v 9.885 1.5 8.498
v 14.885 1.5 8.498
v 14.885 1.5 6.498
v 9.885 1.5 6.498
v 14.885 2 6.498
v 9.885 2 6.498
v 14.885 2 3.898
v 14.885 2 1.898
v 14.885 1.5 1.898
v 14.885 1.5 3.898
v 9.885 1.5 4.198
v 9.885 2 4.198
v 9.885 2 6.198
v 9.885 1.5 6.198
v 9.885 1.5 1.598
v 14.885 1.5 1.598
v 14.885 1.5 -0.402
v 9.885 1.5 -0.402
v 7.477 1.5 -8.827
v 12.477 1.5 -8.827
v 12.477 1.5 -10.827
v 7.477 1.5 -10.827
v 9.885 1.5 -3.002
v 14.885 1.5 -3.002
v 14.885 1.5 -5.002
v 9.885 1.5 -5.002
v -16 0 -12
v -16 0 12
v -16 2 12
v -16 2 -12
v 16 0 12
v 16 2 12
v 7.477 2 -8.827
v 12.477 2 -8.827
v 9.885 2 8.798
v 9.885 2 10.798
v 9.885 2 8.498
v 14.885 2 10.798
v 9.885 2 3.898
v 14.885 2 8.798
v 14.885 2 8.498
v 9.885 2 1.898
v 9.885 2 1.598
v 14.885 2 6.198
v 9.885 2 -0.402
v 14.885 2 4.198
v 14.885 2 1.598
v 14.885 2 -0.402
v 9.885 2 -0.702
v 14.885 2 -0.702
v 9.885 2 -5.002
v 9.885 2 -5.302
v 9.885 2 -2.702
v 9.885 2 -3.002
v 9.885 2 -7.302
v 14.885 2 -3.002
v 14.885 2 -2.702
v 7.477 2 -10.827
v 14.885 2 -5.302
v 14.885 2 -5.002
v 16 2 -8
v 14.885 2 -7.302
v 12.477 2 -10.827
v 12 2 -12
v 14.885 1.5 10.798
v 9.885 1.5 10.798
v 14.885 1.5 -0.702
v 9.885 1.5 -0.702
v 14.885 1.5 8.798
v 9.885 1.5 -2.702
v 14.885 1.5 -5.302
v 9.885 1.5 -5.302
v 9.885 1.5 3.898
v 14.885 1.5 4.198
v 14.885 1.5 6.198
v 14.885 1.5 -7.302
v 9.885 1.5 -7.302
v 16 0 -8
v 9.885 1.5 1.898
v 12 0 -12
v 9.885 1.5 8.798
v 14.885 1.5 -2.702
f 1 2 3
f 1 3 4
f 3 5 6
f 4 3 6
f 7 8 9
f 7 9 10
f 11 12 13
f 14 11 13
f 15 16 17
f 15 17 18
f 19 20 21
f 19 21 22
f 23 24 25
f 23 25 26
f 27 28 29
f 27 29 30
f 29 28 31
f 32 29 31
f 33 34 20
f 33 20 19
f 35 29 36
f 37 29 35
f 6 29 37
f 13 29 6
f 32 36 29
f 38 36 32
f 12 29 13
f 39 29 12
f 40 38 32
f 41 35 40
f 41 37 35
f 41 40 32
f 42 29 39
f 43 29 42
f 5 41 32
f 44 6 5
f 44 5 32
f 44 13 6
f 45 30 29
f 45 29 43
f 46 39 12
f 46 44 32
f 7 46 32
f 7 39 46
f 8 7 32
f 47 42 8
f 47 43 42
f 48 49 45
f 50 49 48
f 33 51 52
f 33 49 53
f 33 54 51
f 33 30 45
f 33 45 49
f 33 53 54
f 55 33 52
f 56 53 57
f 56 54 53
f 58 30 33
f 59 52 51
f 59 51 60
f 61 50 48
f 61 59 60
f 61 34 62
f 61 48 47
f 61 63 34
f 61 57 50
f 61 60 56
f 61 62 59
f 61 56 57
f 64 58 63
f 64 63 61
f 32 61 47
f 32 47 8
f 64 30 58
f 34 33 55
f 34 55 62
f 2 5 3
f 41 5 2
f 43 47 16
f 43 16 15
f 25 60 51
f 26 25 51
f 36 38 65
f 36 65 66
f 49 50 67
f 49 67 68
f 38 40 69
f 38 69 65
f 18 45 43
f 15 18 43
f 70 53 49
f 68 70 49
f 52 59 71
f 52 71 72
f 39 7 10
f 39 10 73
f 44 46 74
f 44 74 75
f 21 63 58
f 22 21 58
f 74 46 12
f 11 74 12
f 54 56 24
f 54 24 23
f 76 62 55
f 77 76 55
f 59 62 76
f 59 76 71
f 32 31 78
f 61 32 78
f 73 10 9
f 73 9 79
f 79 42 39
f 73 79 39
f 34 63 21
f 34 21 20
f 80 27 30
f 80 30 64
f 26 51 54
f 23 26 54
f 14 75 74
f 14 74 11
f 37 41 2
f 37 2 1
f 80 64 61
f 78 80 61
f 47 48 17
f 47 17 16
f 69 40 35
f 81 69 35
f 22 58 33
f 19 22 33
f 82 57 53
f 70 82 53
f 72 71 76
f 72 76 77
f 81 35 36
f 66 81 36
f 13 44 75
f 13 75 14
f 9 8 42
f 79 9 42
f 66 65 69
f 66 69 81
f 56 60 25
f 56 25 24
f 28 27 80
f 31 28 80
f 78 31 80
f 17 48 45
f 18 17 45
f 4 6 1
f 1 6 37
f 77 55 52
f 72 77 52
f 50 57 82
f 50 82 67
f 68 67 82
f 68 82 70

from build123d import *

# Parameters (mm, degrees)
SKETCH_1_W          = 32
SKETCH_1_H          = 24
EXTRUDE_1_DEPTH     = 2
CUT_EXTRUDE_1_DEPTH = 2
SKETCH_3_W          = 5
SKETCH_3_H          = 2
CUT_EXTRUDE_2_DEPTH = 0.5


with BuildPart() as part:
    # 草图1 → 拉伸1 (new body)
    with BuildSketch(Plane(origin=(0, 0, 0), x_dir=(1, 0, 0), z_dir=(0, 1, 0))):
        Rectangle(SKETCH_1_W, SKETCH_1_H)
    extrude(amount=EXTRUDE_1_DEPTH)

    # 草图2 → 切除-拉伸1 (cut)
    with BuildSketch(Plane(origin=(0, 2, 0), x_dir=(-1, 0, 0), z_dir=(0, 1, 0))):
        Polygon((-16, -12), (-12, -12), (-16, -8), align=None)
    extrude(amount=-CUT_EXTRUDE_1_DEPTH, mode=Mode.SUBTRACT)

    # 草图3 → 切除-拉伸2 (cut)
    with BuildSketch(Plane(origin=(0, 2, 0), x_dir=(-1, 0, 0), z_dir=(0, 1, 0))):
        with Locations((-12.385426295, 7.498304406)):
            Rectangle(SKETCH_3_W, SKETCH_3_H)
        with Locations((-12.385426295, 9.798304406)):
            Rectangle(SKETCH_3_W, SKETCH_3_H)
        with Locations((-12.385426295, 5.198304406)):
            Rectangle(SKETCH_3_W, SKETCH_3_H)
        with Locations((-12.385426295, 2.898304406)):
            Rectangle(SKETCH_3_W, SKETCH_3_H)
        with Locations((-12.385426295, 0.598304406)):
            Rectangle(SKETCH_3_W, SKETCH_3_H)
        with Locations((-12.385426295, -1.701695594)):
            Rectangle(SKETCH_3_W, SKETCH_3_H)
        with Locations((-12.385426295, -4.001695594)):
            Rectangle(SKETCH_3_W, SKETCH_3_H)
        with Locations((-12.385426295, -6.301695594)):
            Rectangle(SKETCH_3_W, SKETCH_3_H)
        with Locations((-9.977401753, -9.827028282)):
            Rectangle(SKETCH_3_W, SKETCH_3_H)
    extrude(amount=-CUT_EXTRUDE_2_DEPTH, mode=Mode.SUBTRACT)


solid = part.part
